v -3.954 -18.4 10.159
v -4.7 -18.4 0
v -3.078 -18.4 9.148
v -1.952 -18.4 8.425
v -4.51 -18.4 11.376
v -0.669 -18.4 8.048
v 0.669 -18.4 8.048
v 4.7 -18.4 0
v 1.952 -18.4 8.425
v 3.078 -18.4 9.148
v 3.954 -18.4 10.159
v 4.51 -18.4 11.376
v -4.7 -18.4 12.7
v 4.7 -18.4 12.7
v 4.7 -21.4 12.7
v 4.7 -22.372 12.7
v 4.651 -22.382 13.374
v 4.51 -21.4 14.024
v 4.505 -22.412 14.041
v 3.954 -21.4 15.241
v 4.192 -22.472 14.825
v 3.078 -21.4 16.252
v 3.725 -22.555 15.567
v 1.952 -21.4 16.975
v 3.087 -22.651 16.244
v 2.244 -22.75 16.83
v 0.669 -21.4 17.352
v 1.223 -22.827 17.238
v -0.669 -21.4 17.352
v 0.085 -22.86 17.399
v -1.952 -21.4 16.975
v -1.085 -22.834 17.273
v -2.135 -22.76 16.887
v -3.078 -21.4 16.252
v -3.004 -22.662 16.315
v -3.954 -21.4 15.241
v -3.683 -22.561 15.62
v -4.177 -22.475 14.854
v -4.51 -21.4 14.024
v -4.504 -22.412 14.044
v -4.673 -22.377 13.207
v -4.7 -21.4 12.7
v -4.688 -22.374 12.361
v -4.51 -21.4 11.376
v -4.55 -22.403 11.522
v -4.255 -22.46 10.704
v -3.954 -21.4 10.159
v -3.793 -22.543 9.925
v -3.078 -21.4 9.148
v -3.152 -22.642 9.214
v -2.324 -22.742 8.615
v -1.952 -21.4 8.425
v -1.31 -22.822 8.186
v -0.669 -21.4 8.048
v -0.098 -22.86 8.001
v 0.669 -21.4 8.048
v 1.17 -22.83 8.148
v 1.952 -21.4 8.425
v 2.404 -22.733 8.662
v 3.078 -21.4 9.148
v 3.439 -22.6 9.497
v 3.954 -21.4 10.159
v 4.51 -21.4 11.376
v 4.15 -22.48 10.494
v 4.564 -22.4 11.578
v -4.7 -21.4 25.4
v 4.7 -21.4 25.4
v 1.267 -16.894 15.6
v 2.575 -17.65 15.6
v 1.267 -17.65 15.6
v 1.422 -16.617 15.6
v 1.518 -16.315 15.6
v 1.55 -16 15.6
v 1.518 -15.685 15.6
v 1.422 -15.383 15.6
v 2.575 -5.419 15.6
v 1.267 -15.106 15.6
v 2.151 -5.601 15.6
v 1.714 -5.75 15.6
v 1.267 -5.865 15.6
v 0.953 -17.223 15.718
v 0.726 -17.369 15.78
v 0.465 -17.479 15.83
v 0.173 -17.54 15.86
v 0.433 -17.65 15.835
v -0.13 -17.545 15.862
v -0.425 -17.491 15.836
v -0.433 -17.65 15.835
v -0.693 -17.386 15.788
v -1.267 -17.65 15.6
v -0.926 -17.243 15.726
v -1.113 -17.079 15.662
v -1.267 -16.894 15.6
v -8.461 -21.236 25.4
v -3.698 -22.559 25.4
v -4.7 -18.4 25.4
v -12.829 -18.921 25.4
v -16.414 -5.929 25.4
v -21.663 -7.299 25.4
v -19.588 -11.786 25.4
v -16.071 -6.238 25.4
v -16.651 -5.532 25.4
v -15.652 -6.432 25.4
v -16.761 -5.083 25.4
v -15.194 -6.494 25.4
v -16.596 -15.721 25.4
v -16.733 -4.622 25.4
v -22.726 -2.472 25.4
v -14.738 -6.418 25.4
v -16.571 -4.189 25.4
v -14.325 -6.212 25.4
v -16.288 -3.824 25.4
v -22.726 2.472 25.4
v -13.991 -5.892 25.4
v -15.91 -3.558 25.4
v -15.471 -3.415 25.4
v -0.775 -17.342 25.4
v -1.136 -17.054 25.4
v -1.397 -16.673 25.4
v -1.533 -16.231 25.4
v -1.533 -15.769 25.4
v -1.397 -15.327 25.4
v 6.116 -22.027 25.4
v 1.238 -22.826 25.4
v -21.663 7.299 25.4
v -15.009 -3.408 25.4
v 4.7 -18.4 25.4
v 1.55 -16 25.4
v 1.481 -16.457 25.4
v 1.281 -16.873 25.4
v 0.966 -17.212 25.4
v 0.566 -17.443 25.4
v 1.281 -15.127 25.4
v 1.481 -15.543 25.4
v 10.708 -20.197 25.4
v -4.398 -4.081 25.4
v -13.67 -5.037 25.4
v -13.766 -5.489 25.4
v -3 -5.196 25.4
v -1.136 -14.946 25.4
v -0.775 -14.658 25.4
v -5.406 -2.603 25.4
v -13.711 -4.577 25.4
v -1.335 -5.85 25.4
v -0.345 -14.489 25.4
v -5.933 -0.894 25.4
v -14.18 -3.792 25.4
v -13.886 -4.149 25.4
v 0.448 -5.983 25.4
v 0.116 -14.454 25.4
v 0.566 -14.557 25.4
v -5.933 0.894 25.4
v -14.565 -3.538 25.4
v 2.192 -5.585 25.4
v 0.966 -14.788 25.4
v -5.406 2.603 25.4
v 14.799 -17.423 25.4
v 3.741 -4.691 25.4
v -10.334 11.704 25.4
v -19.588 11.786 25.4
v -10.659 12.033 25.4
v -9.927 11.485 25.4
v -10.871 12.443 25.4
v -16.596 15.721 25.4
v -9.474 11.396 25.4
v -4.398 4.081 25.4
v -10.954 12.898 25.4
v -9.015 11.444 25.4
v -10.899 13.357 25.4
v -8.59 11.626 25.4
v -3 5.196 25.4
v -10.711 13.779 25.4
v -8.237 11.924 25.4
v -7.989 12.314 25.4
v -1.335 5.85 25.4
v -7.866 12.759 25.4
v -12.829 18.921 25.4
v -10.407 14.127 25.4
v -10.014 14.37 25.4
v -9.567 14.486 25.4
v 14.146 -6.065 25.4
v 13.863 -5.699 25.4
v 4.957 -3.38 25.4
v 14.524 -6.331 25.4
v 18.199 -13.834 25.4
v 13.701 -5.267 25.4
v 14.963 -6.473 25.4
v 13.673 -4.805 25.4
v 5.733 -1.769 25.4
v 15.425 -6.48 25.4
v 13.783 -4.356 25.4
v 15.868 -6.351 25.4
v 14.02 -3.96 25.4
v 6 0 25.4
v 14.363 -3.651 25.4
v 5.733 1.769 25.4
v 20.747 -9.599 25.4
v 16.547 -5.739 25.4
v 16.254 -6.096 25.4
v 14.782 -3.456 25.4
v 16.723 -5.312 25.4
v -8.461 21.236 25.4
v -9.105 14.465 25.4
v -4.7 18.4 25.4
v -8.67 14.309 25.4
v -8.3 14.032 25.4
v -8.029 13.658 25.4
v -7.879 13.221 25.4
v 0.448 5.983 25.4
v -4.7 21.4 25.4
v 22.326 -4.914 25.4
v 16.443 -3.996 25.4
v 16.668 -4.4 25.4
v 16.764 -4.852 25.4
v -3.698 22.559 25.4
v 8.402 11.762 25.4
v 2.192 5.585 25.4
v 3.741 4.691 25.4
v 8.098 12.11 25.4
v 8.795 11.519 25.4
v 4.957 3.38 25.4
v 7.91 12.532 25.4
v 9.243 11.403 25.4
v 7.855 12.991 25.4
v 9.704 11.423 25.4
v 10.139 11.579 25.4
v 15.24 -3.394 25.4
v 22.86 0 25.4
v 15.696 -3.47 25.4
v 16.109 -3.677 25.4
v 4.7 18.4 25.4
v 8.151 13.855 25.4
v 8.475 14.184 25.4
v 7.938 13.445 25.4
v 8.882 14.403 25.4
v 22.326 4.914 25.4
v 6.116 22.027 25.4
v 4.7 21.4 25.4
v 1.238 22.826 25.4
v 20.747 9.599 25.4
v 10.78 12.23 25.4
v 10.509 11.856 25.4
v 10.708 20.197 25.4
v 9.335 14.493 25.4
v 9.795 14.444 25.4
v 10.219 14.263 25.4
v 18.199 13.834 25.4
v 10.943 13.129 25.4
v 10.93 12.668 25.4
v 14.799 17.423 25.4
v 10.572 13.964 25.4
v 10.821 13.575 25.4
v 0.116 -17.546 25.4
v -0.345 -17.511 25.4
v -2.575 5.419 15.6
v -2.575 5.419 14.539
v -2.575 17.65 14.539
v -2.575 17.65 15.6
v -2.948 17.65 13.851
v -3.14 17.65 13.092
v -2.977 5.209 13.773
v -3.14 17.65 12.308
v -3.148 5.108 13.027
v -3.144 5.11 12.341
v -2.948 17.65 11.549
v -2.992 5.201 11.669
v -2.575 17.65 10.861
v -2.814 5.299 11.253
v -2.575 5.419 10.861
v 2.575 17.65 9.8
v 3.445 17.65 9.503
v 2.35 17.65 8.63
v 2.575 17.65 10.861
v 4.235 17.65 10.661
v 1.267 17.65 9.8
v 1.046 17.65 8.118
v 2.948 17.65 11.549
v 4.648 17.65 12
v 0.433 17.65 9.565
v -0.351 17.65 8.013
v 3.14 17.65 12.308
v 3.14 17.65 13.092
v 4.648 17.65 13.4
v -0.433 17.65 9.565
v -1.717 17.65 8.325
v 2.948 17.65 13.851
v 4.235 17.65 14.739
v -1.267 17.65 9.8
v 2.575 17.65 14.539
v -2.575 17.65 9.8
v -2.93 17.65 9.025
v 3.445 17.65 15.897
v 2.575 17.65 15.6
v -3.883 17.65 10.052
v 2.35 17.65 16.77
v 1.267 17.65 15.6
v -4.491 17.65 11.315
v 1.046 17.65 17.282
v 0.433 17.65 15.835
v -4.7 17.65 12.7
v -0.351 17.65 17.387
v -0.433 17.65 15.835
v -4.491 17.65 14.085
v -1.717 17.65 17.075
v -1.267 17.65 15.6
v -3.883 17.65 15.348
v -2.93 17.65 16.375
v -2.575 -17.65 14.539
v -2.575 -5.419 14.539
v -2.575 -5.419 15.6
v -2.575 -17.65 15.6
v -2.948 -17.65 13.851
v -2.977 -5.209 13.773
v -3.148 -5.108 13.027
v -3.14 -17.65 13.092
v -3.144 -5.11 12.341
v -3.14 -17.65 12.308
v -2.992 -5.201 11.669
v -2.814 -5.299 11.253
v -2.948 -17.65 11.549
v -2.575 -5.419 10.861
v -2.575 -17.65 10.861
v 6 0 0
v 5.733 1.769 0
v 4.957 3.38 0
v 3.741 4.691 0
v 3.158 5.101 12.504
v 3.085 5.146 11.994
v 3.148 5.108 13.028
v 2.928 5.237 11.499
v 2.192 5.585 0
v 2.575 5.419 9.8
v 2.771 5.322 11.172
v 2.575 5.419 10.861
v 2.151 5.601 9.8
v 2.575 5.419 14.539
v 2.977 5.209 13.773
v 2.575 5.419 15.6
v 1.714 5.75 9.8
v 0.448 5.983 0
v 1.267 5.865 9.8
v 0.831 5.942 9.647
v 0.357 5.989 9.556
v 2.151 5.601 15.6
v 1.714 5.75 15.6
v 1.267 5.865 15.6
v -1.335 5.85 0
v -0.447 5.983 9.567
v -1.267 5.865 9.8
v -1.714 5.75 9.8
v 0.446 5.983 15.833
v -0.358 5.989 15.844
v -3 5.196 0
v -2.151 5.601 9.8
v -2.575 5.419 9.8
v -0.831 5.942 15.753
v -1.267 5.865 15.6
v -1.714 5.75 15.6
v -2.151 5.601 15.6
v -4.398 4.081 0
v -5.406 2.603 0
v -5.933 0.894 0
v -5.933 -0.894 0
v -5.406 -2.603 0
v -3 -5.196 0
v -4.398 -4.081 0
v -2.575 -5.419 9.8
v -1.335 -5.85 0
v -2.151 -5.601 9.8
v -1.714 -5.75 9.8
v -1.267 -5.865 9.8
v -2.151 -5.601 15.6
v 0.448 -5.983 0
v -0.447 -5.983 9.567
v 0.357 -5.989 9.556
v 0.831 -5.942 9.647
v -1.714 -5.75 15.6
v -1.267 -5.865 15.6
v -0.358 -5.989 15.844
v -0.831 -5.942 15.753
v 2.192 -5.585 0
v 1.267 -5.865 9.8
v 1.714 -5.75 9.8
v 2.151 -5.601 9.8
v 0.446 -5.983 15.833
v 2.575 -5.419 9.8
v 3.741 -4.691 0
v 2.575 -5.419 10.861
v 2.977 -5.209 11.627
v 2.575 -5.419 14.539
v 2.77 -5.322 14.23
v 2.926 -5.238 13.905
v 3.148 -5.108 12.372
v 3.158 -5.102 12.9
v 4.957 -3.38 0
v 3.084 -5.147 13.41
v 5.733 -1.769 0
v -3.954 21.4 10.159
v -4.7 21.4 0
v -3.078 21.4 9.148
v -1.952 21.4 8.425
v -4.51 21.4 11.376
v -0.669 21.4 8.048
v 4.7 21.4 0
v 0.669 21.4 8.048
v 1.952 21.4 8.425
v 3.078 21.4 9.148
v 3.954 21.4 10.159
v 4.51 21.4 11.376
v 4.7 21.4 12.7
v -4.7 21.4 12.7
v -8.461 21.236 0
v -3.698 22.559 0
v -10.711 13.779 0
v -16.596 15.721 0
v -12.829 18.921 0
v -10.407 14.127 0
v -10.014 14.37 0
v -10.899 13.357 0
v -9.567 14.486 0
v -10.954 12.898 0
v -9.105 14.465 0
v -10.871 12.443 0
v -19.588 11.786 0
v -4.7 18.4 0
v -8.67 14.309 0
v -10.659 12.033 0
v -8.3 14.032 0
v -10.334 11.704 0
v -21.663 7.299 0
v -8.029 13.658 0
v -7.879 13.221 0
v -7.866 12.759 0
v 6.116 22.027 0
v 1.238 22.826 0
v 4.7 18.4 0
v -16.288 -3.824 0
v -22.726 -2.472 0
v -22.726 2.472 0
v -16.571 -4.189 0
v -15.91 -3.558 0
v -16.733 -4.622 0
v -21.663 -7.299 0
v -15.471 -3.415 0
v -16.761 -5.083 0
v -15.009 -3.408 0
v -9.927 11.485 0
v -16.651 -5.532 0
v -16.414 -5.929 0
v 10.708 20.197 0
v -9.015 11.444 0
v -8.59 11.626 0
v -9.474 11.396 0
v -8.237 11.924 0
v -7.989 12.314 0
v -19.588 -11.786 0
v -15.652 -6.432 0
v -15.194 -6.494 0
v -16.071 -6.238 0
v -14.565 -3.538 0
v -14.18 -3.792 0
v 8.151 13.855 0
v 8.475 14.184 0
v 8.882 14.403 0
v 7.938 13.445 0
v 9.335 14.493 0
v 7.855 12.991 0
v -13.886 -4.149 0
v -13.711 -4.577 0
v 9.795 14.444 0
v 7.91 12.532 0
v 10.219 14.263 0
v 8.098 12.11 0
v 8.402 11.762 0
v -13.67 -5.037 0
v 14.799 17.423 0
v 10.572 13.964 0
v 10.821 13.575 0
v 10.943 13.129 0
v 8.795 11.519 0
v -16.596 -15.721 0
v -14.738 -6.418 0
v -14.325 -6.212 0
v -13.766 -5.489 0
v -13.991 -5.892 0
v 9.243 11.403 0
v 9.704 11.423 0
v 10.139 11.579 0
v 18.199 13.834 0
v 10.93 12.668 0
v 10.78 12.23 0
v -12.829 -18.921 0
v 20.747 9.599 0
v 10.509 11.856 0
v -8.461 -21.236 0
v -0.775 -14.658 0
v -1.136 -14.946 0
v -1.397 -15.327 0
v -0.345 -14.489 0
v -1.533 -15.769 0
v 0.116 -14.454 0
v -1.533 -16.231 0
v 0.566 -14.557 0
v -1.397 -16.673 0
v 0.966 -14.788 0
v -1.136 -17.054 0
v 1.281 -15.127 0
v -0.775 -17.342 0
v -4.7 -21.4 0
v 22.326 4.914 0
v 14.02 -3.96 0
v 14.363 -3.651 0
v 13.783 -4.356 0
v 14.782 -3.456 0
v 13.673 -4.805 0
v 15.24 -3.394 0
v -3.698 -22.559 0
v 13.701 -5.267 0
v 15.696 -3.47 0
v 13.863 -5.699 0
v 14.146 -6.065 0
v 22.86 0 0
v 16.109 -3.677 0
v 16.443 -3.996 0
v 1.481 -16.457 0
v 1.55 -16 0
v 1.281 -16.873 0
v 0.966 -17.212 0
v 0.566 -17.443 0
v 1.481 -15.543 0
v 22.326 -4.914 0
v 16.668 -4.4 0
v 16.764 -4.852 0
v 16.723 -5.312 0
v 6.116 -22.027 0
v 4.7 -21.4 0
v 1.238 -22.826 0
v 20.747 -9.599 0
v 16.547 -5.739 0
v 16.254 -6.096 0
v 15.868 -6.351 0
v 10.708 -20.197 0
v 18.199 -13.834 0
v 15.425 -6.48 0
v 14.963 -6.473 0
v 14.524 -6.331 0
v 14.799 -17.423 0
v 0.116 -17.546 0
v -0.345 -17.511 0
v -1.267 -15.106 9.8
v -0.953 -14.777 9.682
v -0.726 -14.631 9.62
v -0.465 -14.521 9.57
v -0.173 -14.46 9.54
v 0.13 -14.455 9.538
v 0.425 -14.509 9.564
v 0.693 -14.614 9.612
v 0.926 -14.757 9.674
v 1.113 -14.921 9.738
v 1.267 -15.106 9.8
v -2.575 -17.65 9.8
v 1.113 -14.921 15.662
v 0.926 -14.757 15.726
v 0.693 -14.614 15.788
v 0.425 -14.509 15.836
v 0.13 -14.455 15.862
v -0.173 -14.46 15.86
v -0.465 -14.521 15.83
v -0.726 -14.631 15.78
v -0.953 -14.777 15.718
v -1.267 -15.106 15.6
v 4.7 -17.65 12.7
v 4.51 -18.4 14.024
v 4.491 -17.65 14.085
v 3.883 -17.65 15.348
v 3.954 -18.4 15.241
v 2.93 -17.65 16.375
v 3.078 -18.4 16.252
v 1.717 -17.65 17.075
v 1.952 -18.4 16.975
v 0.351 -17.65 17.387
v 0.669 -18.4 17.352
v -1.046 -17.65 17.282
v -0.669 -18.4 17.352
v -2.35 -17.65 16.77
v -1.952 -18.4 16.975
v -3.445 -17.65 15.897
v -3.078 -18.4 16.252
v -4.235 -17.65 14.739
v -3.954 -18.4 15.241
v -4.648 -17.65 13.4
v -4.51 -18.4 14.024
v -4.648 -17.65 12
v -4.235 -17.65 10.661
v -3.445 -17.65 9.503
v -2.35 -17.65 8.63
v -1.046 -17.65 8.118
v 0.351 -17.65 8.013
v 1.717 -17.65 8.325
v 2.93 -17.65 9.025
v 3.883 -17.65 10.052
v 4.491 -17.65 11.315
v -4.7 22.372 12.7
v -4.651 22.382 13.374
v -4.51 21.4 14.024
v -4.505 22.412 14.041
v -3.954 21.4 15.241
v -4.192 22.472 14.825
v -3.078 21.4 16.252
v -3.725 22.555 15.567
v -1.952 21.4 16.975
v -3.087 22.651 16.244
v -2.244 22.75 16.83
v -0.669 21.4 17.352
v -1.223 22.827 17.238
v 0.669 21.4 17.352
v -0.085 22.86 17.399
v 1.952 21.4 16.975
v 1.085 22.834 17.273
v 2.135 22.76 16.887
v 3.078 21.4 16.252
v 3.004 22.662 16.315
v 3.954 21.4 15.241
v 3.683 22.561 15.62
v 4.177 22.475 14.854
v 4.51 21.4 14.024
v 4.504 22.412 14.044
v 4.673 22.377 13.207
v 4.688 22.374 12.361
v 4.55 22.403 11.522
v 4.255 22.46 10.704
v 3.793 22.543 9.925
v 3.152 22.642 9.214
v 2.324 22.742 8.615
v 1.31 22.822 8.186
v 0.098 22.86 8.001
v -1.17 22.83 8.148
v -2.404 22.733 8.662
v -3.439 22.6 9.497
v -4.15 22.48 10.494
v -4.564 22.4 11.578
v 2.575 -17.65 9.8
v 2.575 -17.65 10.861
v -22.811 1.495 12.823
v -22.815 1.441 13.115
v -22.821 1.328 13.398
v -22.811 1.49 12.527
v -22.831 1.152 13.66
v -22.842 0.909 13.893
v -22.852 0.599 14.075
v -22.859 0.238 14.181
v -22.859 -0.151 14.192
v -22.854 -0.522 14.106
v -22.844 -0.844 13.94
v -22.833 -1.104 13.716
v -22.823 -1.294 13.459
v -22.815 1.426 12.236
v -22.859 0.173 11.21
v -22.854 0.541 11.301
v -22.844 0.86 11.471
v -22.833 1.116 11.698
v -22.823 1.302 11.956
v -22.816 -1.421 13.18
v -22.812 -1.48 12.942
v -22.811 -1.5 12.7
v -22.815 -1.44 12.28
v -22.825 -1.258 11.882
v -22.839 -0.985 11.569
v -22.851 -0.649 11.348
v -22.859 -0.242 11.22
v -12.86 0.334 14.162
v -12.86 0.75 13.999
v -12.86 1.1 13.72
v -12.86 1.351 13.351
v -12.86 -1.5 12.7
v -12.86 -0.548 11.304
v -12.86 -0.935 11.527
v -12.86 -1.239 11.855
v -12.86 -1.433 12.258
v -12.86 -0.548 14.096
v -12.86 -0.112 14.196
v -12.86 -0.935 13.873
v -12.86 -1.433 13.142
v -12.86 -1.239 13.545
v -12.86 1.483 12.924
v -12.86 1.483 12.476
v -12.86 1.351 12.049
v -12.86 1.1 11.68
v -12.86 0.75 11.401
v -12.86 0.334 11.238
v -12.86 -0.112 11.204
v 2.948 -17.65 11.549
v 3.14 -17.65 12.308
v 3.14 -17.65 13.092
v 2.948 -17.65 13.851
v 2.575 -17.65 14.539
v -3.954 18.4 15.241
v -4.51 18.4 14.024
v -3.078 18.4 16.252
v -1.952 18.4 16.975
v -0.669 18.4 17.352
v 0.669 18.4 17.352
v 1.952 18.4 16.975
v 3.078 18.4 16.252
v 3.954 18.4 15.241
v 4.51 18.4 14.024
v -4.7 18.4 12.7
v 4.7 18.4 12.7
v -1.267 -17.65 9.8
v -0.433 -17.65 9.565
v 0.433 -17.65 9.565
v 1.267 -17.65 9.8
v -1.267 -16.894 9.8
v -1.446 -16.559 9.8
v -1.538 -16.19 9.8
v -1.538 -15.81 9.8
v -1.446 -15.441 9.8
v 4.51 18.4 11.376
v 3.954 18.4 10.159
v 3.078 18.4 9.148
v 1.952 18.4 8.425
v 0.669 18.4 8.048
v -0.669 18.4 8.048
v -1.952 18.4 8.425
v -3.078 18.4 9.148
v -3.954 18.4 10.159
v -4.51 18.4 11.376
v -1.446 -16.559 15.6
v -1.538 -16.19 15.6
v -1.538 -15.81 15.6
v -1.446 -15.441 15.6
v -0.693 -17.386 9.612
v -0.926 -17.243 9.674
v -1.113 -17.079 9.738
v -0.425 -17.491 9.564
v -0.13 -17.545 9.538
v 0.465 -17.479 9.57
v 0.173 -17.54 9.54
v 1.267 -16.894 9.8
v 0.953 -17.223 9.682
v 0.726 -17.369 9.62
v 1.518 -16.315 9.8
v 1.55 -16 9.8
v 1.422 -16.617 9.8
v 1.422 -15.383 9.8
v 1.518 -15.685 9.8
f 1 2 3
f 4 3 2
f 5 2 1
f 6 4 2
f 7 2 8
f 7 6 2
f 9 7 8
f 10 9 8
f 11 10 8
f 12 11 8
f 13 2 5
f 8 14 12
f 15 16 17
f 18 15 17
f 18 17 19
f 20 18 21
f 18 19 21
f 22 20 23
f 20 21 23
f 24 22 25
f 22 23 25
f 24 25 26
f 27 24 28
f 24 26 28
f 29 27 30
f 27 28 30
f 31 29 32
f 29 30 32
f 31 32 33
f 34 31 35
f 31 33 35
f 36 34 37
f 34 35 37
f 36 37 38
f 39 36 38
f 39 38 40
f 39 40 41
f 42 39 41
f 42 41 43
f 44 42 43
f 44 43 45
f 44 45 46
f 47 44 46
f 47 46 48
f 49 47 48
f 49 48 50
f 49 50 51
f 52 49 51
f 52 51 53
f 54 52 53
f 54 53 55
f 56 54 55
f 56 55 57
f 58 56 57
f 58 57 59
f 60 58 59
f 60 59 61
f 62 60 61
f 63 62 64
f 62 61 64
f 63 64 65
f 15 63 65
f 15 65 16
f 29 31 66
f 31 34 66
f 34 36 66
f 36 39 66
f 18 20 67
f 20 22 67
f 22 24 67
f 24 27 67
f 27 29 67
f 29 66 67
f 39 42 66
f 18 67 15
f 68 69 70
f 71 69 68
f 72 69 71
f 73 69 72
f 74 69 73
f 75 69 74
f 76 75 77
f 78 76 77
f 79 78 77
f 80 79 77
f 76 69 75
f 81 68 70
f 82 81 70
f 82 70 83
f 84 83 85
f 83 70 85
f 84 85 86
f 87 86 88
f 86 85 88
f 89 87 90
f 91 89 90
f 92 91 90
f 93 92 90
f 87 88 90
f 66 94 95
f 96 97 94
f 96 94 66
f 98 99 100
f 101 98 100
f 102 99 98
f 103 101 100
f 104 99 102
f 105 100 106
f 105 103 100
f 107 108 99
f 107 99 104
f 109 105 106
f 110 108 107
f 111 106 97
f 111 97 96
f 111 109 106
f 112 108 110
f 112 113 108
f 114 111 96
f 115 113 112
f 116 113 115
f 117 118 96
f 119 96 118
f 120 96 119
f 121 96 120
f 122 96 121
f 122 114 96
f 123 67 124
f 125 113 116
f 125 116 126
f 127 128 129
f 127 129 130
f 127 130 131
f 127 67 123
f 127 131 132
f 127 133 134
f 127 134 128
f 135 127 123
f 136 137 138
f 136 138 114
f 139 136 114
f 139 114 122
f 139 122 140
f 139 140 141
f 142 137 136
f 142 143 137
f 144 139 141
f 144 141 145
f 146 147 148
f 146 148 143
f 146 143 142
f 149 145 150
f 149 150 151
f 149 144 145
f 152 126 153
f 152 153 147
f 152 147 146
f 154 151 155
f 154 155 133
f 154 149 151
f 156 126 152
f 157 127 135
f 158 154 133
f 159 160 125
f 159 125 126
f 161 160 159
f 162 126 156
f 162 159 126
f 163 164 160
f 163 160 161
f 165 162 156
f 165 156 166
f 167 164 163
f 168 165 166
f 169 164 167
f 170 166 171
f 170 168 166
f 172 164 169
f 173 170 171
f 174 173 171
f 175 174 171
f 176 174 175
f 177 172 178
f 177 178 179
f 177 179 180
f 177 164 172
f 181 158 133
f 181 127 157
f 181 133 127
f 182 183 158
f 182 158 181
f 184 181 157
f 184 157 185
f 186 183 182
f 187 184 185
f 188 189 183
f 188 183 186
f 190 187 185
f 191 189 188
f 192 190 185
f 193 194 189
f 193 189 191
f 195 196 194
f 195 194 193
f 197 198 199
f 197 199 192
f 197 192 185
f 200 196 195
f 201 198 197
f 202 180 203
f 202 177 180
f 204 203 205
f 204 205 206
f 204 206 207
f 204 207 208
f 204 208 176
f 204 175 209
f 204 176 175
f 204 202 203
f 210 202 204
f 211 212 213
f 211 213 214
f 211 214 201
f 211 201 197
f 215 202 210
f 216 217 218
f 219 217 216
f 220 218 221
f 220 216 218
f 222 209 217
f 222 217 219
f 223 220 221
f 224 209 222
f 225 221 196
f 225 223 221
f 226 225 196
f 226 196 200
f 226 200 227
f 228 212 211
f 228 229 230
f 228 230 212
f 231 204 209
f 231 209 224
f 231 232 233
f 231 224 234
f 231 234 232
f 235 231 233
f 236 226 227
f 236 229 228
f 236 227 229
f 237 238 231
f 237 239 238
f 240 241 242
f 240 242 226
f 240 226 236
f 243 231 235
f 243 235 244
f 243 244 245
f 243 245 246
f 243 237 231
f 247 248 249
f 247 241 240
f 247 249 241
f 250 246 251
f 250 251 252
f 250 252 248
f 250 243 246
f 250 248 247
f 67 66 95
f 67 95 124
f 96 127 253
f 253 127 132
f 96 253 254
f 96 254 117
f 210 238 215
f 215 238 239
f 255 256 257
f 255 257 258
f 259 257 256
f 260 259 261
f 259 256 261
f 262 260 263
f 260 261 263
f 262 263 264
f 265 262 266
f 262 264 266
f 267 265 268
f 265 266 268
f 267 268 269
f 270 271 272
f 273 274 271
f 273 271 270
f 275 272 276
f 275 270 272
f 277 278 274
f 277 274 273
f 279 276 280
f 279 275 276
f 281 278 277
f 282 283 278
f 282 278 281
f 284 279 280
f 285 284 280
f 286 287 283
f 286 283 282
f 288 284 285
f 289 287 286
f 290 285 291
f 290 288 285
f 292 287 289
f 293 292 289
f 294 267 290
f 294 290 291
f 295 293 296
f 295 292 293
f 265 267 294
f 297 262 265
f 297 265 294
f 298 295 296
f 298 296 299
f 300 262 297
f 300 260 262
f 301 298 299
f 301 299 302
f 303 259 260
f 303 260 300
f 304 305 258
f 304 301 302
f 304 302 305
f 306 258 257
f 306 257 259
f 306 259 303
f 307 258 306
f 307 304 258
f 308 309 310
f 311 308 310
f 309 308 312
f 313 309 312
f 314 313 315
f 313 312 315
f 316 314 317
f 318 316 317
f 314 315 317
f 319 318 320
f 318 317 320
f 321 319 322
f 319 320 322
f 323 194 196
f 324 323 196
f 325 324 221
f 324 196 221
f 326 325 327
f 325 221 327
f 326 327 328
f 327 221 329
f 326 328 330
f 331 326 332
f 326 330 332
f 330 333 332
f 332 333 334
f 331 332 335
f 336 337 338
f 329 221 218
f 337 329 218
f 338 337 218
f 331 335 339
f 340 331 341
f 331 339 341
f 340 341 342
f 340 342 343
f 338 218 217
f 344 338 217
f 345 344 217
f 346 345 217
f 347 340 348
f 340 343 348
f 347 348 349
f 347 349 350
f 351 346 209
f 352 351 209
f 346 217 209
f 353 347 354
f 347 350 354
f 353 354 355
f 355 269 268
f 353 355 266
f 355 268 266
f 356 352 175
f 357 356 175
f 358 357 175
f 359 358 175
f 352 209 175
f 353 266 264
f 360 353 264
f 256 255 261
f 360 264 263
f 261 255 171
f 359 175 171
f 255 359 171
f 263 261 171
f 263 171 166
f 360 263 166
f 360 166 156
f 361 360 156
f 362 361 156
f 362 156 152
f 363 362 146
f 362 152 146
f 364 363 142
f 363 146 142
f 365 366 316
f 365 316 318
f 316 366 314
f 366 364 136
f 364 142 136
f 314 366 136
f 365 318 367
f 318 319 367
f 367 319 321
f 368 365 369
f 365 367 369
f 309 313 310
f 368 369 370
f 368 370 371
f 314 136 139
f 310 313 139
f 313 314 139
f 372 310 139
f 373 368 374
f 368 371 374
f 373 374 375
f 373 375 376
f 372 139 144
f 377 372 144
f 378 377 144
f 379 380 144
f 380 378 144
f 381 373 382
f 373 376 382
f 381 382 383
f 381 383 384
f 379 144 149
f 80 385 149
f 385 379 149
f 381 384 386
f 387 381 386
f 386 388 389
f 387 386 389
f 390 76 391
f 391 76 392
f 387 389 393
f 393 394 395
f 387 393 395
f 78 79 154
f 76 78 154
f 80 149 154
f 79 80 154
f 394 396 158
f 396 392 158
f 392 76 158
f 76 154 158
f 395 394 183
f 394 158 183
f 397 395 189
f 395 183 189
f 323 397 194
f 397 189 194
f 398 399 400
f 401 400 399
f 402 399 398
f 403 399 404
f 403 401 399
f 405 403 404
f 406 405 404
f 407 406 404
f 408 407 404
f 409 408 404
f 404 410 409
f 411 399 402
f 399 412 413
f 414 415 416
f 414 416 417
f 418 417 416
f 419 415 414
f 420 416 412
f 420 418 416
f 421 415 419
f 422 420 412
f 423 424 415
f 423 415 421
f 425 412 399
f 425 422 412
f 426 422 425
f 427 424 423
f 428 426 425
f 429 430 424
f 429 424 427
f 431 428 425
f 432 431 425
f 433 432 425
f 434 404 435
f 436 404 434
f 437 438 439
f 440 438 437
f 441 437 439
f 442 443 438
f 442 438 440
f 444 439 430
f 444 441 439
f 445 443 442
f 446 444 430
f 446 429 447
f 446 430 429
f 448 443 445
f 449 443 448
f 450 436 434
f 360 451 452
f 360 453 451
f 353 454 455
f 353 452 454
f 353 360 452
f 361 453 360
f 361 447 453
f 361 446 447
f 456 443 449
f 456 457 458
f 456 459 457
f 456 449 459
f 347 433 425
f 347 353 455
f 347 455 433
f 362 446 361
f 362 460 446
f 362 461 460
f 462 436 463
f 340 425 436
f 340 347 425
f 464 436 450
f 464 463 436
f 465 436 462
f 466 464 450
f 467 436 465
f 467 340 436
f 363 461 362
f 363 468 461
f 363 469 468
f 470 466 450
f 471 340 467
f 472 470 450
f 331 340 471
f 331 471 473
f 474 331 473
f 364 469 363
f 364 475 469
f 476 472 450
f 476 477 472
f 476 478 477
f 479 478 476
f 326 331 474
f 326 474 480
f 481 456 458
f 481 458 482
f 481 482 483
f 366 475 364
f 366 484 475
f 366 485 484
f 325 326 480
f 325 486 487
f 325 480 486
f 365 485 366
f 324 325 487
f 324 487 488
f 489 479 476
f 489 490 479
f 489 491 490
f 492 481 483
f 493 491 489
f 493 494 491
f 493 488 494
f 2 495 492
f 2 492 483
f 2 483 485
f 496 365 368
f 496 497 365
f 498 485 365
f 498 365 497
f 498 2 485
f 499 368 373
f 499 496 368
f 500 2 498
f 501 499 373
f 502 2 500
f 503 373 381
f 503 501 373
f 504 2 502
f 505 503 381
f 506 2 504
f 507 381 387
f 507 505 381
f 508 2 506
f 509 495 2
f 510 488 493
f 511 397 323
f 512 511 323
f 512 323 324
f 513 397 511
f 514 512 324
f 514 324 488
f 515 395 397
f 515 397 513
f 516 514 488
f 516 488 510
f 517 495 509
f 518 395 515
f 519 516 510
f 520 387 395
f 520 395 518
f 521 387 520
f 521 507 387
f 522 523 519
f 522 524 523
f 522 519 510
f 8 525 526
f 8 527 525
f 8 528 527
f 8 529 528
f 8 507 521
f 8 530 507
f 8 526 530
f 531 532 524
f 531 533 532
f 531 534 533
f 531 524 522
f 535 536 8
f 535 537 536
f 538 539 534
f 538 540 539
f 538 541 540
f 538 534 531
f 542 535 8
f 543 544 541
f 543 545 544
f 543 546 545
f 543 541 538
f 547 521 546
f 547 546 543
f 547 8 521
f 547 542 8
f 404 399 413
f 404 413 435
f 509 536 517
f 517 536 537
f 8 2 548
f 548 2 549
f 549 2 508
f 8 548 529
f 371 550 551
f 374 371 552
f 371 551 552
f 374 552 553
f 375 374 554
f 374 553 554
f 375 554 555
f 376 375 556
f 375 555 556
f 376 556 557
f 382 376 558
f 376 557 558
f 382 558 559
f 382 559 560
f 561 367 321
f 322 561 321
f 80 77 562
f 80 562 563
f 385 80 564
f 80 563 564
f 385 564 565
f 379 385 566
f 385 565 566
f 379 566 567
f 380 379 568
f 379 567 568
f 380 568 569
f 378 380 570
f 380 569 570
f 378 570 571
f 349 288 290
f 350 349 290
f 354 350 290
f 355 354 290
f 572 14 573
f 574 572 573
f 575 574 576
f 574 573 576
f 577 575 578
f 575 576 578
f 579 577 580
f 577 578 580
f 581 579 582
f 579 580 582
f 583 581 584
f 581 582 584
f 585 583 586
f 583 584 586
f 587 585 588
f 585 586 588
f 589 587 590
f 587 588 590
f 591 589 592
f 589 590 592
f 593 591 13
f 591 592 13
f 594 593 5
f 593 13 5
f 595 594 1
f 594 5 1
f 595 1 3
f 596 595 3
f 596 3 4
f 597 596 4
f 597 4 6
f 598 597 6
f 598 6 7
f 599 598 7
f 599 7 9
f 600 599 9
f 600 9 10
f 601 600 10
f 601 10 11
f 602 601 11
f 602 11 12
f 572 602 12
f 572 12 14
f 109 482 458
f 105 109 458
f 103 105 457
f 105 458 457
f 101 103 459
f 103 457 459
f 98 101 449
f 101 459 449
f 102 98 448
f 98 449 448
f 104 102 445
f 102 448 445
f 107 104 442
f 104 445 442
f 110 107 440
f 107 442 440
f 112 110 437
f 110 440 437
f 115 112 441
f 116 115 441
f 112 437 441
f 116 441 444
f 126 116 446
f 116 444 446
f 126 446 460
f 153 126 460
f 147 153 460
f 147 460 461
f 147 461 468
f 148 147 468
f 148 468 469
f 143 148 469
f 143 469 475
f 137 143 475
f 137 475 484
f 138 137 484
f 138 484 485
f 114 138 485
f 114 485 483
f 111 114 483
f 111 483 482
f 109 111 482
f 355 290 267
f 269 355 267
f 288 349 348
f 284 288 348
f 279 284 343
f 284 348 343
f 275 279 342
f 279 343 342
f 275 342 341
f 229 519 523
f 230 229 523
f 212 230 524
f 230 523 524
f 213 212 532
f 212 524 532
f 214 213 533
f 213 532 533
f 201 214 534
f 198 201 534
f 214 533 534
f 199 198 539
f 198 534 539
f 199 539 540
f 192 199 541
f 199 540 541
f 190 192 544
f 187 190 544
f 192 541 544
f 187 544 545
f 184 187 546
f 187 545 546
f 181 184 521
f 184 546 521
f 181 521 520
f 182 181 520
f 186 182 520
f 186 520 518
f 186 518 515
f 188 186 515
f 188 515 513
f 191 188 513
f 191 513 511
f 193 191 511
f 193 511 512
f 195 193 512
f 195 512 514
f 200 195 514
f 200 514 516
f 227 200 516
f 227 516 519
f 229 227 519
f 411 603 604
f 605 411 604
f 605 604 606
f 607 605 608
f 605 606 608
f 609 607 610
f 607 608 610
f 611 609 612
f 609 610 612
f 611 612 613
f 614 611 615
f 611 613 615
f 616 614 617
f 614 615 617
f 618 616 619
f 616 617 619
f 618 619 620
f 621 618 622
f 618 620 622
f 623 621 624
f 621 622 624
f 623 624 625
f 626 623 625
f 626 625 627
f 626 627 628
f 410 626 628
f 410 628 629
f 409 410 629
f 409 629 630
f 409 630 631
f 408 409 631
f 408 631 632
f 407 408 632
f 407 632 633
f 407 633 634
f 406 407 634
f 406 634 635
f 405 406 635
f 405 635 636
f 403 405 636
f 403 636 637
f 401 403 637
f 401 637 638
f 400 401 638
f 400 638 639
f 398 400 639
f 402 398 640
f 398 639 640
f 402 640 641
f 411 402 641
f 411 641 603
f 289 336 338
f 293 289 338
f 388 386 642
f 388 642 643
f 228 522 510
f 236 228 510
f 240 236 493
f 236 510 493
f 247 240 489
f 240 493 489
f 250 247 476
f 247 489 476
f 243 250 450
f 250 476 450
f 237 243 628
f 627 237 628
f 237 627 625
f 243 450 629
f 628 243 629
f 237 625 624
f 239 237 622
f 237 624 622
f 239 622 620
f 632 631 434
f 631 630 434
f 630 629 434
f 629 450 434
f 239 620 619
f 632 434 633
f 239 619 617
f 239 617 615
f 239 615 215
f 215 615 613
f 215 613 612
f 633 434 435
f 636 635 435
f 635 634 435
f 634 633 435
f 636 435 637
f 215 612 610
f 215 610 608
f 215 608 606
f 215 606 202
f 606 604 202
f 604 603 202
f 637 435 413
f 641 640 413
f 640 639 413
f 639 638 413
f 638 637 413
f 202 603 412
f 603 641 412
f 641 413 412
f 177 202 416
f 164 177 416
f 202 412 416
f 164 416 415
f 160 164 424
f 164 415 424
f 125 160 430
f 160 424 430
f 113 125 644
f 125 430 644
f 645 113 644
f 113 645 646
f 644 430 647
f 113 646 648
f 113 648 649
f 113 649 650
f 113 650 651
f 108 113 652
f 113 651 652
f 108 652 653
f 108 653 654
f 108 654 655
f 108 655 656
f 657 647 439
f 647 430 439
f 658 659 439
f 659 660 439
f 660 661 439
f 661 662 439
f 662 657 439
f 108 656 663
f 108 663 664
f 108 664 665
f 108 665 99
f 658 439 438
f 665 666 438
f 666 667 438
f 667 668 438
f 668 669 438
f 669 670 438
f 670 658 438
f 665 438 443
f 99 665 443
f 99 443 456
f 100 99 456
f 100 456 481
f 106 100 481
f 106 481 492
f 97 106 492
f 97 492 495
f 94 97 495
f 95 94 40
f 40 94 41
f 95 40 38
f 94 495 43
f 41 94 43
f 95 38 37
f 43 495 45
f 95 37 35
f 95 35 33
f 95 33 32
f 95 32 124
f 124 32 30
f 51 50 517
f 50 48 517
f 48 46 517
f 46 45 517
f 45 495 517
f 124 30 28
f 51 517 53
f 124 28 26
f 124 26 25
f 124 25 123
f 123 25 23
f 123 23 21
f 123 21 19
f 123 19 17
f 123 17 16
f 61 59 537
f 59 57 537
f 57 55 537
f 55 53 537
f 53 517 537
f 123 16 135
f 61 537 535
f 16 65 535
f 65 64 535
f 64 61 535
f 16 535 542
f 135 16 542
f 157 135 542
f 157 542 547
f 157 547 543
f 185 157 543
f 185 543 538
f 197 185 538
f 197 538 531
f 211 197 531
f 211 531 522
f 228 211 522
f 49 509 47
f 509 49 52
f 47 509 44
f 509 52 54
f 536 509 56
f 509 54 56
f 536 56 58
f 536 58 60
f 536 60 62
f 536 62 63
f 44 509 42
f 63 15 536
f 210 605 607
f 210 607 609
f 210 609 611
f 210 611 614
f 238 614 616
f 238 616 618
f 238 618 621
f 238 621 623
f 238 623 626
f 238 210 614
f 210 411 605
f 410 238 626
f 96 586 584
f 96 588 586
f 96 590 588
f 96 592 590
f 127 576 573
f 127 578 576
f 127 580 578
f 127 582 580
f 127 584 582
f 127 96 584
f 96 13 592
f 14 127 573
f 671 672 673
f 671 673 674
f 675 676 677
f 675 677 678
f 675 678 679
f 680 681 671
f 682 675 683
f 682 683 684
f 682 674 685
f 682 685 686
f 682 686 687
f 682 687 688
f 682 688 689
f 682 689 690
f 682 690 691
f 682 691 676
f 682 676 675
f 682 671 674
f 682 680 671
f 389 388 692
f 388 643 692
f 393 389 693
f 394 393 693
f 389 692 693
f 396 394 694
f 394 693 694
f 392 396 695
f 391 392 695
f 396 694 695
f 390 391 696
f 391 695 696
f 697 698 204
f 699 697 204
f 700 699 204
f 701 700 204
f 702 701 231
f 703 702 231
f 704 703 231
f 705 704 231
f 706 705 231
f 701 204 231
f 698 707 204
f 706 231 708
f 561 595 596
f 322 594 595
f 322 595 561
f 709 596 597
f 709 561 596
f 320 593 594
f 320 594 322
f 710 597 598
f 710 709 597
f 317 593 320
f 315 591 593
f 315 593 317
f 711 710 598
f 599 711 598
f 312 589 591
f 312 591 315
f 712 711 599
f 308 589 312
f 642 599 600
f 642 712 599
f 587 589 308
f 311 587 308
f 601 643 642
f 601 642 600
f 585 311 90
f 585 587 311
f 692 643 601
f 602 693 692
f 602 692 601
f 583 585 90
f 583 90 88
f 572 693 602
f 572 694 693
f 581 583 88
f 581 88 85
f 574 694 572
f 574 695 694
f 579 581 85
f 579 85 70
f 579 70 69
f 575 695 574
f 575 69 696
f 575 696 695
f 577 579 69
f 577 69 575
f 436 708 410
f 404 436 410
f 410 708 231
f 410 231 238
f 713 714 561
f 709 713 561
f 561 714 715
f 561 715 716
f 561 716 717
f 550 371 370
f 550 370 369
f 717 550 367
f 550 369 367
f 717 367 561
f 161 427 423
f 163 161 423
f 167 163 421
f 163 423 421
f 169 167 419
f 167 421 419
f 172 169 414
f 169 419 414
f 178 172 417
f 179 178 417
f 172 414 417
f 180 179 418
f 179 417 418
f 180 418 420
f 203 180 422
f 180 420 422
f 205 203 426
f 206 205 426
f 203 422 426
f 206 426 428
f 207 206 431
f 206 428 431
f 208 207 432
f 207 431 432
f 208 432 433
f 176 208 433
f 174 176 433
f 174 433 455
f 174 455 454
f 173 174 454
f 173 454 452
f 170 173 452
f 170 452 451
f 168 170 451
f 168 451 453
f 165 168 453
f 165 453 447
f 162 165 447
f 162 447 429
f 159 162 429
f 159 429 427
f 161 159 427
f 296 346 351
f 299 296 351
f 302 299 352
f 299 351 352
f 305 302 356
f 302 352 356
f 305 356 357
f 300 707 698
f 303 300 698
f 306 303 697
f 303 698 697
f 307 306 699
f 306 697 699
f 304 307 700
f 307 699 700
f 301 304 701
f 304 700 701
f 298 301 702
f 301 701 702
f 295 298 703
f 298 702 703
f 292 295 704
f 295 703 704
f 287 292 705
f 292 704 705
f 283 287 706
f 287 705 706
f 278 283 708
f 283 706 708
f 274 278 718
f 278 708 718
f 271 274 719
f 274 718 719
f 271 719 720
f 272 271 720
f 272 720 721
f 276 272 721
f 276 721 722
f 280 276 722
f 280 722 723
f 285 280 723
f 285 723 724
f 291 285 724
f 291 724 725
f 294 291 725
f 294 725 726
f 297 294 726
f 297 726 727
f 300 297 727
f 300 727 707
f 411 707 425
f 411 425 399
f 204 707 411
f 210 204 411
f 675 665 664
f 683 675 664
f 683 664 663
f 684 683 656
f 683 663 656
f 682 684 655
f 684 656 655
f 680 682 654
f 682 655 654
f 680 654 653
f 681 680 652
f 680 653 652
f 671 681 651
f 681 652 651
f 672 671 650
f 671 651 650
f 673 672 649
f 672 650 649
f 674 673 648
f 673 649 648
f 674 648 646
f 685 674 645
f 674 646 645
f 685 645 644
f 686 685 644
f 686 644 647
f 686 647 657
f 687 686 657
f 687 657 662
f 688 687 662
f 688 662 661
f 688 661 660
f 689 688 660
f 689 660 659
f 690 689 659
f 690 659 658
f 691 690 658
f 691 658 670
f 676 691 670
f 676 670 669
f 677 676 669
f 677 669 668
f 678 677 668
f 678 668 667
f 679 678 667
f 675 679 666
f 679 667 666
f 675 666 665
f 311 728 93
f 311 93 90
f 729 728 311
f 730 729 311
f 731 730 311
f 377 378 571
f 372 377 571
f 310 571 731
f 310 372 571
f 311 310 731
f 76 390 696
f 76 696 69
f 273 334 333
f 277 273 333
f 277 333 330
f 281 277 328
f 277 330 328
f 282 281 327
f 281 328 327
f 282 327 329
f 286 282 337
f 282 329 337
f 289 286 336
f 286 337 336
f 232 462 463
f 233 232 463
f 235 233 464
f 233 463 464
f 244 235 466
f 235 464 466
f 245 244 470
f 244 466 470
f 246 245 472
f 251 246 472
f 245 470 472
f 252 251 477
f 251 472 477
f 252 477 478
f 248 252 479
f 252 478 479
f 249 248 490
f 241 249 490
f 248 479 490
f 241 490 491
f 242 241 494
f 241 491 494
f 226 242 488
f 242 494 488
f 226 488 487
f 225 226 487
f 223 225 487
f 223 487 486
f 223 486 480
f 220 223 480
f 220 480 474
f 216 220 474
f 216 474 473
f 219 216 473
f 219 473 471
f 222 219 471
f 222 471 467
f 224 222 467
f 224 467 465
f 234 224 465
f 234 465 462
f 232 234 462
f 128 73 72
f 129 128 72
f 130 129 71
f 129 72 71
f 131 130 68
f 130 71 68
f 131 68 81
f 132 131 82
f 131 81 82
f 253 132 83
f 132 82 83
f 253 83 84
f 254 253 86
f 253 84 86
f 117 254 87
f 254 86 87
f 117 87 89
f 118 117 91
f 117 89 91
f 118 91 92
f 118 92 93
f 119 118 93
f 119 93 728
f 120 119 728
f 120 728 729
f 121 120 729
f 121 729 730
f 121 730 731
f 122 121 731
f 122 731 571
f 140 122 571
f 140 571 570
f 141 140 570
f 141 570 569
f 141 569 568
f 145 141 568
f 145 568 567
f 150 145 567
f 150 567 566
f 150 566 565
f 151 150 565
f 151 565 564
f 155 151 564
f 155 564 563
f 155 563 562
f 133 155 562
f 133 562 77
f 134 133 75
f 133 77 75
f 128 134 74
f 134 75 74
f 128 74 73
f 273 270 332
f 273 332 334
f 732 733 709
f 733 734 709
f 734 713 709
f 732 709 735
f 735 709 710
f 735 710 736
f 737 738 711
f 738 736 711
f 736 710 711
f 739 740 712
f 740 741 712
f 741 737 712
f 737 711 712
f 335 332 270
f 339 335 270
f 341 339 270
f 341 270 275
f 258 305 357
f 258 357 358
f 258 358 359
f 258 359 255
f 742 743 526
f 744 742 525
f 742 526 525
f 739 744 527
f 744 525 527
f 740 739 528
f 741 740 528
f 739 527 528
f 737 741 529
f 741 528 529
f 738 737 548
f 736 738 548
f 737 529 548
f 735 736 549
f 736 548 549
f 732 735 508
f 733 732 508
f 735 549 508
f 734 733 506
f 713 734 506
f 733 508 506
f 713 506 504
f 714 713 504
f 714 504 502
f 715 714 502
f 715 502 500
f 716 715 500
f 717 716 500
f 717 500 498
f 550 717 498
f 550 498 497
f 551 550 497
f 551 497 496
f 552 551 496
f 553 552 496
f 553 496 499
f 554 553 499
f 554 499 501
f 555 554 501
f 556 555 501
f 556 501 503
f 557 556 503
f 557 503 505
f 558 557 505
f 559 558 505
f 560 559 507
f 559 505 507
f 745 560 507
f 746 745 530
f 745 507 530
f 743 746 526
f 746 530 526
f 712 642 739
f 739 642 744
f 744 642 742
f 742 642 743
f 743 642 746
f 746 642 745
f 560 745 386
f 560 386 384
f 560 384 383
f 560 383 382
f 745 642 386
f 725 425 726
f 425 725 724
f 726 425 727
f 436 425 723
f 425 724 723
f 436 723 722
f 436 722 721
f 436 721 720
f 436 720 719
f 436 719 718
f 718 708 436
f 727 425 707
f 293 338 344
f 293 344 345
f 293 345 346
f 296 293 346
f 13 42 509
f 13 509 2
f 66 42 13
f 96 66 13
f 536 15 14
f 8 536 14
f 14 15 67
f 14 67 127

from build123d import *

# Parameters (mm, degrees)
SKETCH019_R           = 22.86
PAD003_DEPTH          = 25.4
SKETCH021_R           = 1.55
POCKET017_DEPTH       = 164.33691
POLARPATTERN007_COUNT = 5
SKETCH022_W           = 45.72
SKETCH022_H           = 45.72
PAD004_DEPTH          = 10
SKETCH023_W           = 5.15
SKETCH023_H           = 5.8
POCKET018_DEPTH       = 45.721
SKETCH025_R           = 4.7
POCKET020_DEPTH       = 5.21
SKETCH028_R           = 6
POCKET023_DEPTH       = 35.401
SKETCH027_R           = 1.5
POCKET024_DEPTH       = 10
SKETCH029_R           = 4.7
POCKET025_DEPTH       = 5.21
SKETCH031_W           = 9.4
SKETCH031_H           = 3
POCKET027_DEPTH       = 35.401
SKETCH034_R           = 3.1645
POCKET029_DEPTH       = 45.721
SKETCH030_W           = 45.72
SKETCH030_H           = 45.72
POCKET030_DEPTH       = 10


with BuildPart() as part:
    # Sketch019 → Pad003 (new body)
    with BuildSketch(Plane.XY):
        Circle(SKETCH019_R)
    extrude(amount=PAD003_DEPTH)

    # Sketch021 → Pocket017 (cut, through all)
    with BuildSketch(Plane(origin=(0, 0, 0), x_dir=(1, 0, 0), z_dir=(0, 0, -1))):
        with Locations((0, 16)):
            Circle(SKETCH021_R)
    pocket017 = extrude(amount=-POCKET017_DEPTH, mode=Mode.SUBTRACT)

    # PolarPattern007: Pocket017 ×5 about axis
    polarpattern007_axis = Axis((0, 0, 0), (0, 0, -1))
    for i in range(1, POLARPATTERN007_COUNT):
        add(pocket017.rotate(polarpattern007_axis, i * 360 / POLARPATTERN007_COUNT), mode=Mode.SUBTRACT)

    # Sketch022 (on Face2 of PolarPattern007) → Pad004 (join)
    with BuildSketch(Plane(origin=(0, 0, 0), x_dir=(1, 0, 0), z_dir=(0, 0, -1))):
        Rectangle(SKETCH022_W, SKETCH022_H)
    extrude(amount=PAD004_DEPTH)

    # Sketch023 (on Face7 of Pad004) → Pocket018 (cut, through all)
    with BuildSketch(Plane(origin=(0, 22.86, 0), x_dir=(-1, 0, 0), z_dir=(0, 1, 0))):
        with Locations((0, 12.7)):
            Rectangle(SKETCH023_W, SKETCH023_H)
    extrude(amount=-POCKET018_DEPTH, mode=Mode.SUBTRACT)

    # Sketch025 → Pocket020 (cut)
    with BuildSketch(Plane.XZ.offset(22.86)):
        with Locations((0, 12.7)):
            Circle(SKETCH025_R)
    extrude(amount=-POCKET020_DEPTH, mode=Mode.SUBTRACT)

    # Sketch028 → Pocket023 (cut, through all)
    with BuildSketch(Plane.XY.offset(25.4)):
        Circle(SKETCH028_R)
    extrude(amount=-POCKET023_DEPTH, mode=Mode.SUBTRACT)

    # Sketch027 (on Face14 of Pocket023) → Pocket024 (cut)
    with BuildSketch(Plane(origin=(-22.86, 0, 0), x_dir=(0, -1, 0), z_dir=(-1, 0, 0))):
        with Locations((0, 12.7)):
            Circle(SKETCH027_R)
    extrude(amount=-POCKET024_DEPTH, mode=Mode.SUBTRACT)

    # Sketch029 (on Face19 of Pocket024) → Pocket025 (cut)
    with BuildSketch(Plane(origin=(0, 22.86, 0), x_dir=(-1, 0, 0), z_dir=(0, 1, 0))):
        with Locations((0, 12.7)):
            Circle(SKETCH029_R)
    extrude(amount=-POCKET025_DEPTH, mode=Mode.SUBTRACT)

    # Sketch031 → Pocket027 (cut, through all)
    with BuildSketch(Plane.XY.offset(25.4)):
        with Locations((0, 19.9)):
            Rectangle(SKETCH031_W, SKETCH031_H)
        with Locations((0, -19.9)):
            Rectangle(SKETCH031_W, SKETCH031_H)
    extrude(amount=-POCKET027_DEPTH, mode=Mode.SUBTRACT)

    # Sketch034 → Pocket029 (cut, through all)
    with BuildSketch(Plane.XZ.offset(22.86)):
        with Locations((0, 12.7)):
            Circle(SKETCH034_R)
    extrude(amount=-POCKET029_DEPTH, mode=Mode.SUBTRACT)

    # Sketch030 (on Face31 of Pocket029) → Pocket030 (cut)
    with BuildSketch(Plane(origin=(0, 0, -10), x_dir=(1, 0, 0), z_dir=(0, 0, -1))):
        Rectangle(SKETCH030_W, SKETCH030_H)
    extrude(amount=-POCKET030_DEPTH, mode=Mode.SUBTRACT)


solid = part.part
